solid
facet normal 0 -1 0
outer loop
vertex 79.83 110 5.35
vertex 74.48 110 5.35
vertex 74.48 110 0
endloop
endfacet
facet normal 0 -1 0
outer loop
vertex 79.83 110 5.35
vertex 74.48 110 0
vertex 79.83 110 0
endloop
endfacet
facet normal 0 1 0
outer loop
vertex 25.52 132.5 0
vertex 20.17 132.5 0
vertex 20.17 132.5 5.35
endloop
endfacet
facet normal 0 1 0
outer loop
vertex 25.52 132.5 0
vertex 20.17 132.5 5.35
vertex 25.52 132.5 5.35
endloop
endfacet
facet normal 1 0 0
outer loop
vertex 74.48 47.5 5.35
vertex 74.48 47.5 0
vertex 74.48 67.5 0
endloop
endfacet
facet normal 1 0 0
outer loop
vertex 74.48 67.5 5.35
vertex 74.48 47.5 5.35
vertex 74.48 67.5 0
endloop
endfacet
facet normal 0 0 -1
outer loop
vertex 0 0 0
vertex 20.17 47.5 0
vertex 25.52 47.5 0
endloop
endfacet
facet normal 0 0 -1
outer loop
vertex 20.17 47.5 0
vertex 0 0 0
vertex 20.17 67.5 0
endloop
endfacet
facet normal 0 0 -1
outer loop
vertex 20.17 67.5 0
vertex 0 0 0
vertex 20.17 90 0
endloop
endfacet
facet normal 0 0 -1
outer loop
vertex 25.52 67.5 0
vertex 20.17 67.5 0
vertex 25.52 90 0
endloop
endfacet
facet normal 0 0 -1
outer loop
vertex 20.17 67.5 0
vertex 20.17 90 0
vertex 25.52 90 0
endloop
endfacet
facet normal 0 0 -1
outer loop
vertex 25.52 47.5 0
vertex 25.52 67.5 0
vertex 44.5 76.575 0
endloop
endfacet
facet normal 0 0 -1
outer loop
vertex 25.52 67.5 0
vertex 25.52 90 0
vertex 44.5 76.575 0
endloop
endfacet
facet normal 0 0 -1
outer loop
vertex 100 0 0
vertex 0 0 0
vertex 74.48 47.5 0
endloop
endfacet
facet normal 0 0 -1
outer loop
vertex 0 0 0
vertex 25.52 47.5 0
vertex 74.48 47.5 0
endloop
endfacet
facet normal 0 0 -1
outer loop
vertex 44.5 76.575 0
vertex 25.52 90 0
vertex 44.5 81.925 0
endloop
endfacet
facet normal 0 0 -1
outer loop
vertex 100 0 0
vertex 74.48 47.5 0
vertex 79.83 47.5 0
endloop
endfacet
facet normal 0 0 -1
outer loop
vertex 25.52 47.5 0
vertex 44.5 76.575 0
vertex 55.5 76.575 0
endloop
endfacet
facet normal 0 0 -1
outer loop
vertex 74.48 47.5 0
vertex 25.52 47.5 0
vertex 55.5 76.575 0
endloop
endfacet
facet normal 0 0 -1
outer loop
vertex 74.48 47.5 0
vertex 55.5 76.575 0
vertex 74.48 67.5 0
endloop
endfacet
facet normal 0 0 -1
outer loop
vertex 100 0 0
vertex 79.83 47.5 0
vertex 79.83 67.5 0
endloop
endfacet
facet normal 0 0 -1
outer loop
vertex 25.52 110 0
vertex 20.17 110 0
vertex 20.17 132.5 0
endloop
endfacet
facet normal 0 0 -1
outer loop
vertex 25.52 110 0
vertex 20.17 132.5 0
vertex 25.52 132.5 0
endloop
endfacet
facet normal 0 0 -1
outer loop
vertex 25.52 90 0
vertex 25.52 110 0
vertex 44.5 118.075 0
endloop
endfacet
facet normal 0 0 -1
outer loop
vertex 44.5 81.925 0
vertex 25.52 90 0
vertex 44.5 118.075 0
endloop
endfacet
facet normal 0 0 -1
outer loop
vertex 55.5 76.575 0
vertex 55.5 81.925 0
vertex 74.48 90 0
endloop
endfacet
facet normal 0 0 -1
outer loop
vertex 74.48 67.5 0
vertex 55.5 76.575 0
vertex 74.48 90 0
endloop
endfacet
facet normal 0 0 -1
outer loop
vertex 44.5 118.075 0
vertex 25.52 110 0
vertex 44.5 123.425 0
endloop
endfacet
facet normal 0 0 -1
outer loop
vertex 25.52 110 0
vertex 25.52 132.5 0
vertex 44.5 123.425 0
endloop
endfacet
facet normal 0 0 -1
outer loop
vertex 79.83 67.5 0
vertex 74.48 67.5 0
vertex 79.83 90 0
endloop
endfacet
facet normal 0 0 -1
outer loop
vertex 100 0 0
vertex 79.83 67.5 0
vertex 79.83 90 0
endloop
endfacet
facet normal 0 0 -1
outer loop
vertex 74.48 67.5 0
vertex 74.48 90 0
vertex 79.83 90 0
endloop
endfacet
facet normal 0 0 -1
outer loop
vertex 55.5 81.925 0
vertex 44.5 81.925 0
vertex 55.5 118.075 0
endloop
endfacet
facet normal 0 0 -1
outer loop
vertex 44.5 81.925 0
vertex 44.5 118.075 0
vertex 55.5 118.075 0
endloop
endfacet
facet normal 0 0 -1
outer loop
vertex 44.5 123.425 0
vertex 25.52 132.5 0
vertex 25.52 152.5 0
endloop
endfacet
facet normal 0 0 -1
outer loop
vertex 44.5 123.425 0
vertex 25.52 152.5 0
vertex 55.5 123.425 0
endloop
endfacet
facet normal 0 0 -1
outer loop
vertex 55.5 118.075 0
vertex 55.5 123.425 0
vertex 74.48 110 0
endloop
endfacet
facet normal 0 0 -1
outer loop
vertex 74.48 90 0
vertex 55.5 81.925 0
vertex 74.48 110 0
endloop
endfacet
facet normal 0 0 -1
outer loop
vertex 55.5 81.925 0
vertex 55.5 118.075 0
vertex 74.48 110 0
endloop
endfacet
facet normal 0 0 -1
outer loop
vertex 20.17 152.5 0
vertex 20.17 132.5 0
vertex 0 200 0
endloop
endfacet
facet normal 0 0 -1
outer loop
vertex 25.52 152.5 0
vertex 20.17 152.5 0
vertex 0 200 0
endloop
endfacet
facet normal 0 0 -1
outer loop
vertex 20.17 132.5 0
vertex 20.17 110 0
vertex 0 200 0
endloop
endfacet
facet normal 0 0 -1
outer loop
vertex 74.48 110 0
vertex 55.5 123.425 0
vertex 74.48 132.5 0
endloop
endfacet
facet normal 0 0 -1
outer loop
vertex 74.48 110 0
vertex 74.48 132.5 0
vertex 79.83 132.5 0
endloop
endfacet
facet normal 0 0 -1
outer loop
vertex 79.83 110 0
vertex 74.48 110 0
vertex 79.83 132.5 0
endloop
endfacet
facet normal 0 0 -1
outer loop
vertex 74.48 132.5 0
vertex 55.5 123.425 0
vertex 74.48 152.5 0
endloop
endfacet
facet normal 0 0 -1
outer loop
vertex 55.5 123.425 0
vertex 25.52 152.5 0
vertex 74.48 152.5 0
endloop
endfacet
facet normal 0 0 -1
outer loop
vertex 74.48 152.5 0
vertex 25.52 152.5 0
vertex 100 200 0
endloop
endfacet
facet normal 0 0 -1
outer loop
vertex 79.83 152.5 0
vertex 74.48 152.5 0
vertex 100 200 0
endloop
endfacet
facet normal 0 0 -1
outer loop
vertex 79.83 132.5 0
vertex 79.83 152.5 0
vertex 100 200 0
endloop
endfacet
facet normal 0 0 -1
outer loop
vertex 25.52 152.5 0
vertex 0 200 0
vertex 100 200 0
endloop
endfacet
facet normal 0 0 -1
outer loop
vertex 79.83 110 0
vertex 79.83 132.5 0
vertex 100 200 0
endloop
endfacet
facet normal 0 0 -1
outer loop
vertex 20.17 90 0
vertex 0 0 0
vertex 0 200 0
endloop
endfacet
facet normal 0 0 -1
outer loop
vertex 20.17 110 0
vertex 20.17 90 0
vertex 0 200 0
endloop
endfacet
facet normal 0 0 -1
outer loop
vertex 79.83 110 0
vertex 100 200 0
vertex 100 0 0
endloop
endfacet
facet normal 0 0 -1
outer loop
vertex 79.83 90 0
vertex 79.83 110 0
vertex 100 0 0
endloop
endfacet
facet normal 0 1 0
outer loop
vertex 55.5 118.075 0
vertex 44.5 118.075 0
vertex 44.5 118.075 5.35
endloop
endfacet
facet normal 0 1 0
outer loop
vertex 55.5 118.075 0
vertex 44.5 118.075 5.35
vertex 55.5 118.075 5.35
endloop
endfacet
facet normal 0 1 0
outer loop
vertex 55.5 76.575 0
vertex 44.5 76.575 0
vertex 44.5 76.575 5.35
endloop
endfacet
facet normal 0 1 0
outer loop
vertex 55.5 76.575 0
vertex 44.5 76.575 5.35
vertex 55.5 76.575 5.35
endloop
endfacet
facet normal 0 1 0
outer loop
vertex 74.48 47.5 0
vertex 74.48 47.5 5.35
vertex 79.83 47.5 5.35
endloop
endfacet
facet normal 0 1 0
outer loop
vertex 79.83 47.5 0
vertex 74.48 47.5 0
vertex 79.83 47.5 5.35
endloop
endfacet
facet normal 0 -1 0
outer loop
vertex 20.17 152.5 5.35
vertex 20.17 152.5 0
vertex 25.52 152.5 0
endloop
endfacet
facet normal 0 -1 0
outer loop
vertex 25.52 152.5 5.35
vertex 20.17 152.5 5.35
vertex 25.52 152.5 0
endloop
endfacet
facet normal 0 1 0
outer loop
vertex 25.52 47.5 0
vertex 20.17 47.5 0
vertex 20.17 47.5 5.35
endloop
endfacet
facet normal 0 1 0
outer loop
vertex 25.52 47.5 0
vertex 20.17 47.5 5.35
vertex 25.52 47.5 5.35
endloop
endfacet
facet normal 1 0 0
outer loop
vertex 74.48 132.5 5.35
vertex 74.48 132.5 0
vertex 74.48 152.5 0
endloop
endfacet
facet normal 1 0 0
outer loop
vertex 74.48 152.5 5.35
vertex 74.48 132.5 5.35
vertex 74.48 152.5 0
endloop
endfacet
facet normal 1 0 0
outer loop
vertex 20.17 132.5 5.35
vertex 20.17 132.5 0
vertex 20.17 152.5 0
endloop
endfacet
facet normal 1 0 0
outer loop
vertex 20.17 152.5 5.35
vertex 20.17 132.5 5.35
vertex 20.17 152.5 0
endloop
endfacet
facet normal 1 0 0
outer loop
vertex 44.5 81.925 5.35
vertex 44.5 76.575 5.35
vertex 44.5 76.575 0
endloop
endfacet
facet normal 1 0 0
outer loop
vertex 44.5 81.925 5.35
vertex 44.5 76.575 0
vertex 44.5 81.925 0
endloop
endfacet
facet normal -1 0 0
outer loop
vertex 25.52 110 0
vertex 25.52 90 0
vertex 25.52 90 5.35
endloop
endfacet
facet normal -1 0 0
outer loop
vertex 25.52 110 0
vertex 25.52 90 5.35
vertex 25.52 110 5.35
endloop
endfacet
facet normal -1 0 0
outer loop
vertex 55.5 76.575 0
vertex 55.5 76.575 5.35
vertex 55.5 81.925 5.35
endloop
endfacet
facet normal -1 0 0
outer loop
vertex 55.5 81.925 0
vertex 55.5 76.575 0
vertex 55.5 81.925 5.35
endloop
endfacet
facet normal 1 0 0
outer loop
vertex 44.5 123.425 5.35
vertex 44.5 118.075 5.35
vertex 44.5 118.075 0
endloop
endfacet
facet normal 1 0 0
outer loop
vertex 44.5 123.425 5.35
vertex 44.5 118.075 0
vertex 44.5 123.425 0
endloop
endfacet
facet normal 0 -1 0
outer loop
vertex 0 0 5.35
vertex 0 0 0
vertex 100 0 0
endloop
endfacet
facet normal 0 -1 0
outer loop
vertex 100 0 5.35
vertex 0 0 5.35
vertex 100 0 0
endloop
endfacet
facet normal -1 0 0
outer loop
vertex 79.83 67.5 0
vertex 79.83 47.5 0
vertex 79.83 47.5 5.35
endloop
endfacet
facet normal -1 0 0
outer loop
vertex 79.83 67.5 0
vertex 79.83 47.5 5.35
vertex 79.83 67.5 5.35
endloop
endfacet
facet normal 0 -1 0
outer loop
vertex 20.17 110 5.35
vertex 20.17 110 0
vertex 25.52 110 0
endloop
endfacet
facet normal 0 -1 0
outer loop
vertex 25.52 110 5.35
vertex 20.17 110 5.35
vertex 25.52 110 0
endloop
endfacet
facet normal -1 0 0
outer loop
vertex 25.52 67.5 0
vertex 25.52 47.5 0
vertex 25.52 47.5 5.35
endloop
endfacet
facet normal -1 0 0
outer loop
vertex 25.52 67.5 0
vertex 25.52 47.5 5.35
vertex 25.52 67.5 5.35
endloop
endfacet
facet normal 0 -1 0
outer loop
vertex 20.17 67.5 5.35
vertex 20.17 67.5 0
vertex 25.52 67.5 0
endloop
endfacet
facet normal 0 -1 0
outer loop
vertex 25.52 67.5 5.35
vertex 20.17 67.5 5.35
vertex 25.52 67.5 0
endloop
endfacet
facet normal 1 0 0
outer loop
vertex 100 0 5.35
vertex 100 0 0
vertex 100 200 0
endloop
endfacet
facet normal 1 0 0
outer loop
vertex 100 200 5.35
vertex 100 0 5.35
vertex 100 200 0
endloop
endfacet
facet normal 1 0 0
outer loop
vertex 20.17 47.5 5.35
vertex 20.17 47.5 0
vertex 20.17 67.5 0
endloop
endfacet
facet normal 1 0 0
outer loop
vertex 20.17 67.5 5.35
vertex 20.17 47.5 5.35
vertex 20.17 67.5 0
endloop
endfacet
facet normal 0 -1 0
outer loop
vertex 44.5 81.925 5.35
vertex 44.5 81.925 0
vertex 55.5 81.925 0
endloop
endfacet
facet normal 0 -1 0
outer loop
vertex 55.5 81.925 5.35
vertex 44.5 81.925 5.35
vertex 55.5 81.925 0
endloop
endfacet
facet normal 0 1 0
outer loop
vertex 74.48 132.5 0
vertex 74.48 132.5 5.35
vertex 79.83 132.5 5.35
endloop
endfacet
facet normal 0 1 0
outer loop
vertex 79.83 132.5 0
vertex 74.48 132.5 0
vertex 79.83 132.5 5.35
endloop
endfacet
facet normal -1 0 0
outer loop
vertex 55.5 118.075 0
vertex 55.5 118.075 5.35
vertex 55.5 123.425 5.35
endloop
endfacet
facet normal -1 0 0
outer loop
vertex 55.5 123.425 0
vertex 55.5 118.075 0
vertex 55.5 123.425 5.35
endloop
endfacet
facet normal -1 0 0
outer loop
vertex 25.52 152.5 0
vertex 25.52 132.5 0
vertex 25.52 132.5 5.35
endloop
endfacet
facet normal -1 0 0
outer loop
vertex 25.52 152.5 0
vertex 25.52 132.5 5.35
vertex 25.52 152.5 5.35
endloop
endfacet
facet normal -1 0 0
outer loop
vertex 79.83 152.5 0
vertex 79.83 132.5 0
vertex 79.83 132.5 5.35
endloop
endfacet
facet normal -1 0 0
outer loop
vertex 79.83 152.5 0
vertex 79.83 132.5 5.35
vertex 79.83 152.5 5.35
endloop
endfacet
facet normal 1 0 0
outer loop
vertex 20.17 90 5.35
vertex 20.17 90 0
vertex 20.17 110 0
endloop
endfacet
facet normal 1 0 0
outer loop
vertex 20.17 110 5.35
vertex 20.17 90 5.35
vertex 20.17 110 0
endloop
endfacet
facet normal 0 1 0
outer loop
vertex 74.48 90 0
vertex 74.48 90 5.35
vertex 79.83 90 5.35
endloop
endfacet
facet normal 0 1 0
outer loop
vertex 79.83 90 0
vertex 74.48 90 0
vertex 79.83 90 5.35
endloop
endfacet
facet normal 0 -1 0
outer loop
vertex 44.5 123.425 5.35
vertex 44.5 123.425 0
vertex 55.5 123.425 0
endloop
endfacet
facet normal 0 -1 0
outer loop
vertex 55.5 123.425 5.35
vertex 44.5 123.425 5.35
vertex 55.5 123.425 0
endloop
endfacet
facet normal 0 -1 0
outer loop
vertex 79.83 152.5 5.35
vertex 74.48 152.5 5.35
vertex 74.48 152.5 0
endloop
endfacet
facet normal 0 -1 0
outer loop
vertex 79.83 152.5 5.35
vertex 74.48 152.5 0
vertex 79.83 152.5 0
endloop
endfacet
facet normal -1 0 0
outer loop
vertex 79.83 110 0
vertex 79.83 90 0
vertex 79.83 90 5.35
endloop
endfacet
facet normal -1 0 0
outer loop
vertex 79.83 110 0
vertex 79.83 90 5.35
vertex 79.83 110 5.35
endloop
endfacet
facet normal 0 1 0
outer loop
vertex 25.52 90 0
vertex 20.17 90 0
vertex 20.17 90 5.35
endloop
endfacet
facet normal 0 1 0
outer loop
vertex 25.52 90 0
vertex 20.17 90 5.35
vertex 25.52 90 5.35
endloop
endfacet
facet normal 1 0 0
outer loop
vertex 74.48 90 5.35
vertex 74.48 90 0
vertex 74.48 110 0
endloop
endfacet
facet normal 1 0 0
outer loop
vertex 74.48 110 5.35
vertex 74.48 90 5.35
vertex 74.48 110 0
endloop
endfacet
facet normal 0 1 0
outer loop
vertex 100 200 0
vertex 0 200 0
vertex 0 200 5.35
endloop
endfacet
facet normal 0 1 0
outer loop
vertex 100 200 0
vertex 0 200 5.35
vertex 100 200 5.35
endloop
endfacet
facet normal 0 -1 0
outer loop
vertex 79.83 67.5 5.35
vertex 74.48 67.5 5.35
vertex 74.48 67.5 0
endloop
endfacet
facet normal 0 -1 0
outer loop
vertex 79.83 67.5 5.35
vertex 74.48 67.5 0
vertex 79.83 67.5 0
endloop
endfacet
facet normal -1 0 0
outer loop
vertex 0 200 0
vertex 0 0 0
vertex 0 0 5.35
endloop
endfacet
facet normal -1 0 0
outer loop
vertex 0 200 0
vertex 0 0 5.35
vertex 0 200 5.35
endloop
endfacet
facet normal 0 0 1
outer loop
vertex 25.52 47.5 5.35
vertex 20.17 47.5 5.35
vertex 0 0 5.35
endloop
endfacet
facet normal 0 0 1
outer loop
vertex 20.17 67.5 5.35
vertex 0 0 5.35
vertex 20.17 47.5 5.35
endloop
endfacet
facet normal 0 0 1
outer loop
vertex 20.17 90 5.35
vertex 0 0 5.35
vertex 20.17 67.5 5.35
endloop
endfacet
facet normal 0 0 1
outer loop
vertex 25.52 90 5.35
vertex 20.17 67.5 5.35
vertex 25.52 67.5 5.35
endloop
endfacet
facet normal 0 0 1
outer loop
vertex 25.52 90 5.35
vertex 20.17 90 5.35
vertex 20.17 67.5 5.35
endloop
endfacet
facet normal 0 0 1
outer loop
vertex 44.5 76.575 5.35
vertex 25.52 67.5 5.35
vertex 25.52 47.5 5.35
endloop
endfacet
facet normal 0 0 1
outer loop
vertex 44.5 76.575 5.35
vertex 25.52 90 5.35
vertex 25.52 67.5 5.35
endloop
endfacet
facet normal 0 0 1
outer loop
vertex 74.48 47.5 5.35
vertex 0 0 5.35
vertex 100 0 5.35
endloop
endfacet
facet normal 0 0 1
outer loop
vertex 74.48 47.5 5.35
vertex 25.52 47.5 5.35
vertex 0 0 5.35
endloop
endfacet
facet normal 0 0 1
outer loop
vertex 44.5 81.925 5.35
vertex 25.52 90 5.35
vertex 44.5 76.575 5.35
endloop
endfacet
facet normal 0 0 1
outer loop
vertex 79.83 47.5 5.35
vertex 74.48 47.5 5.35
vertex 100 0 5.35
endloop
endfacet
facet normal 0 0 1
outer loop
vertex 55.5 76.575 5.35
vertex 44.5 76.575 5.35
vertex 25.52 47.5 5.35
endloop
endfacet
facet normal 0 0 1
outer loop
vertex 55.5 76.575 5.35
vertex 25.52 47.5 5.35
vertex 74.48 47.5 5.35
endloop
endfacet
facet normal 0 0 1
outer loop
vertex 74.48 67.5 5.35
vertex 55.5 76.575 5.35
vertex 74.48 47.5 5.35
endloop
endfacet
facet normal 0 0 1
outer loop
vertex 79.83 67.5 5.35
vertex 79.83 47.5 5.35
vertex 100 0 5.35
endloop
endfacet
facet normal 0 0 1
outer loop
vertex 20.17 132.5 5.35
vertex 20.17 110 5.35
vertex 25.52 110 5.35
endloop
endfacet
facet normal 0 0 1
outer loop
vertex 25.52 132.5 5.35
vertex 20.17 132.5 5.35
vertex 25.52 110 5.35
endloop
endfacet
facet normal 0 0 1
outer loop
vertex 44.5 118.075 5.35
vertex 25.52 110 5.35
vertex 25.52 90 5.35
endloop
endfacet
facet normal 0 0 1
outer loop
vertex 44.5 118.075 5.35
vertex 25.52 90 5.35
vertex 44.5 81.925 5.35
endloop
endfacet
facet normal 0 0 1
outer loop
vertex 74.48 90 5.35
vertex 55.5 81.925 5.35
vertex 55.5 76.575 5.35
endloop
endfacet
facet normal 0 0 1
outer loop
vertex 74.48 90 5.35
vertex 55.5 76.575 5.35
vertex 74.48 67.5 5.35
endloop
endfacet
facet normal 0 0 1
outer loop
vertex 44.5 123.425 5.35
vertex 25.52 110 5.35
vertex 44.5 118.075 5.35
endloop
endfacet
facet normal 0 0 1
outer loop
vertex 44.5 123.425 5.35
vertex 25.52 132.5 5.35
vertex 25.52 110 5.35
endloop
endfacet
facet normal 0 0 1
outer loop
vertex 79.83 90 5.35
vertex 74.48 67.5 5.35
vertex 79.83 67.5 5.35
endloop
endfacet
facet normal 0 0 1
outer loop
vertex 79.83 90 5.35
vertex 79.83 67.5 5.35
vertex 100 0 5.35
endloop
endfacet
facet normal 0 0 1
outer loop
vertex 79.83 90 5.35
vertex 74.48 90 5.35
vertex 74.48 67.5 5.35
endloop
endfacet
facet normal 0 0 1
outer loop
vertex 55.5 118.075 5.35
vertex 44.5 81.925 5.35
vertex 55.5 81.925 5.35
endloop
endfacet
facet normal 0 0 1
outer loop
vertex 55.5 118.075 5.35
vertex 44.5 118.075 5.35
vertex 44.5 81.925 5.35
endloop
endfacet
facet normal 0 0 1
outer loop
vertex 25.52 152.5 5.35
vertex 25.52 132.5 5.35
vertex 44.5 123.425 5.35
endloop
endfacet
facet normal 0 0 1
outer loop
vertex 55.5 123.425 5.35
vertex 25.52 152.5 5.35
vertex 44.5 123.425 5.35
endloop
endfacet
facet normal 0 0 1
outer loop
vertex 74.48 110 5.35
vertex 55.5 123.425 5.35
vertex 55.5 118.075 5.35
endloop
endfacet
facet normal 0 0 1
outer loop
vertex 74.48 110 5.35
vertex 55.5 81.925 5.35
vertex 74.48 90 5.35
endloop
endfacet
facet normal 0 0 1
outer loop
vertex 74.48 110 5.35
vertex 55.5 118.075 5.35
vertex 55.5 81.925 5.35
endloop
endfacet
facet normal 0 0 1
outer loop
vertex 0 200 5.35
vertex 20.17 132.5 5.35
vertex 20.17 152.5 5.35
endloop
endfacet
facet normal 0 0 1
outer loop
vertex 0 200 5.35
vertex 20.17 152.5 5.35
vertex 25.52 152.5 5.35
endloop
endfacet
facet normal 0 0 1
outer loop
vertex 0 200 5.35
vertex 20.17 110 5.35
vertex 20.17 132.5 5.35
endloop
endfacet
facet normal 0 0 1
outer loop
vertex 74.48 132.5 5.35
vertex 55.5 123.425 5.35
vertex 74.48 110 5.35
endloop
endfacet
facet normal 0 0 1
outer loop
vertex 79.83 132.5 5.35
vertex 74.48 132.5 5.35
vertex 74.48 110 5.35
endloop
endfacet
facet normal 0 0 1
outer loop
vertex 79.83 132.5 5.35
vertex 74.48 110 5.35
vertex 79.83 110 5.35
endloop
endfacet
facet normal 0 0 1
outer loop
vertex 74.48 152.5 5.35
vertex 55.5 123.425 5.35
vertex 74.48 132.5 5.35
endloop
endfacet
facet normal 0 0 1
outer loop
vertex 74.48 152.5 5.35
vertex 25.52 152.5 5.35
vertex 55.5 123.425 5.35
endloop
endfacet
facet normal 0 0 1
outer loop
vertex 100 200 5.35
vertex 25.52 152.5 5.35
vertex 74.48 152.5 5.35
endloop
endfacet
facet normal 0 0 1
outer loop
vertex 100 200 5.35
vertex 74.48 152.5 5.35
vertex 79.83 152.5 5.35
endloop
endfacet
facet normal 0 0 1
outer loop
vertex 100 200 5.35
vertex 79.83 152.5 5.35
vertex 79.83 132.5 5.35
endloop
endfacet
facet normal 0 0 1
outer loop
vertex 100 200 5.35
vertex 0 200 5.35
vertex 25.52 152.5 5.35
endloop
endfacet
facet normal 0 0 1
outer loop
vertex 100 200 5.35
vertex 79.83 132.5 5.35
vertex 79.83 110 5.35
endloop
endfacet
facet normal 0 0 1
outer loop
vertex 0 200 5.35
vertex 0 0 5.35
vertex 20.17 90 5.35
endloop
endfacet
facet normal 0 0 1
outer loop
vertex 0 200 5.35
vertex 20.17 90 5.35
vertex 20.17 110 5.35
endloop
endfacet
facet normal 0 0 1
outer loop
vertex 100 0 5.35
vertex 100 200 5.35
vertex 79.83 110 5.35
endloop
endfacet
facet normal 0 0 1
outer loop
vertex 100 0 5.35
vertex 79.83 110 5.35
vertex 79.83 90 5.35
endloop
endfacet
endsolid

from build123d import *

# Parameters (mm, degrees)
MODEL_W             = 100
MODEL_H             = 200
MODEL_W_2           = 5.35
MODEL_H_2           = 20
MODEL_W_3           = 11
MODEL_H_3           = 5.35
BOSS_EXTRUDE1_DEPTH = 5.35


with BuildPart() as part:
    # Model → Boss-Extrude1 (new body)
    with BuildSketch(Plane.XY):
        with Locations((50, 100)):
            Rectangle(MODEL_W, MODEL_H)
        with Locations((22.845, 142.5)):
            Rectangle(MODEL_W_2, MODEL_H_2, mode=Mode.SUBTRACT)
        with Locations((77.155, 57.5)):
            Rectangle(MODEL_W_2, MODEL_H_2, mode=Mode.SUBTRACT)
        with Locations((22.845, 100)):
            Rectangle(MODEL_W_2, MODEL_H_2, mode=Mode.SUBTRACT)
        with Locations((22.845, 57.5)):
            Rectangle(MODEL_W_2, MODEL_H_2, mode=Mode.SUBTRACT)
        with Locations((77.155, 100)):
            Rectangle(MODEL_W_2, MODEL_H_2, mode=Mode.SUBTRACT)
        with Locations((77.155, 142.5)):
            Rectangle(MODEL_W_2, MODEL_H_2, mode=Mode.SUBTRACT)
        with Locations((50, 120.75)):
            Rectangle(MODEL_W_3, MODEL_H_3, mode=Mode.SUBTRACT)
        with Locations((50, 79.25)):
            Rectangle(MODEL_W_3, MODEL_H_3, mode=Mode.SUBTRACT)
    extrude(amount=BOSS_EXTRUDE1_DEPTH)


solid = part.part
